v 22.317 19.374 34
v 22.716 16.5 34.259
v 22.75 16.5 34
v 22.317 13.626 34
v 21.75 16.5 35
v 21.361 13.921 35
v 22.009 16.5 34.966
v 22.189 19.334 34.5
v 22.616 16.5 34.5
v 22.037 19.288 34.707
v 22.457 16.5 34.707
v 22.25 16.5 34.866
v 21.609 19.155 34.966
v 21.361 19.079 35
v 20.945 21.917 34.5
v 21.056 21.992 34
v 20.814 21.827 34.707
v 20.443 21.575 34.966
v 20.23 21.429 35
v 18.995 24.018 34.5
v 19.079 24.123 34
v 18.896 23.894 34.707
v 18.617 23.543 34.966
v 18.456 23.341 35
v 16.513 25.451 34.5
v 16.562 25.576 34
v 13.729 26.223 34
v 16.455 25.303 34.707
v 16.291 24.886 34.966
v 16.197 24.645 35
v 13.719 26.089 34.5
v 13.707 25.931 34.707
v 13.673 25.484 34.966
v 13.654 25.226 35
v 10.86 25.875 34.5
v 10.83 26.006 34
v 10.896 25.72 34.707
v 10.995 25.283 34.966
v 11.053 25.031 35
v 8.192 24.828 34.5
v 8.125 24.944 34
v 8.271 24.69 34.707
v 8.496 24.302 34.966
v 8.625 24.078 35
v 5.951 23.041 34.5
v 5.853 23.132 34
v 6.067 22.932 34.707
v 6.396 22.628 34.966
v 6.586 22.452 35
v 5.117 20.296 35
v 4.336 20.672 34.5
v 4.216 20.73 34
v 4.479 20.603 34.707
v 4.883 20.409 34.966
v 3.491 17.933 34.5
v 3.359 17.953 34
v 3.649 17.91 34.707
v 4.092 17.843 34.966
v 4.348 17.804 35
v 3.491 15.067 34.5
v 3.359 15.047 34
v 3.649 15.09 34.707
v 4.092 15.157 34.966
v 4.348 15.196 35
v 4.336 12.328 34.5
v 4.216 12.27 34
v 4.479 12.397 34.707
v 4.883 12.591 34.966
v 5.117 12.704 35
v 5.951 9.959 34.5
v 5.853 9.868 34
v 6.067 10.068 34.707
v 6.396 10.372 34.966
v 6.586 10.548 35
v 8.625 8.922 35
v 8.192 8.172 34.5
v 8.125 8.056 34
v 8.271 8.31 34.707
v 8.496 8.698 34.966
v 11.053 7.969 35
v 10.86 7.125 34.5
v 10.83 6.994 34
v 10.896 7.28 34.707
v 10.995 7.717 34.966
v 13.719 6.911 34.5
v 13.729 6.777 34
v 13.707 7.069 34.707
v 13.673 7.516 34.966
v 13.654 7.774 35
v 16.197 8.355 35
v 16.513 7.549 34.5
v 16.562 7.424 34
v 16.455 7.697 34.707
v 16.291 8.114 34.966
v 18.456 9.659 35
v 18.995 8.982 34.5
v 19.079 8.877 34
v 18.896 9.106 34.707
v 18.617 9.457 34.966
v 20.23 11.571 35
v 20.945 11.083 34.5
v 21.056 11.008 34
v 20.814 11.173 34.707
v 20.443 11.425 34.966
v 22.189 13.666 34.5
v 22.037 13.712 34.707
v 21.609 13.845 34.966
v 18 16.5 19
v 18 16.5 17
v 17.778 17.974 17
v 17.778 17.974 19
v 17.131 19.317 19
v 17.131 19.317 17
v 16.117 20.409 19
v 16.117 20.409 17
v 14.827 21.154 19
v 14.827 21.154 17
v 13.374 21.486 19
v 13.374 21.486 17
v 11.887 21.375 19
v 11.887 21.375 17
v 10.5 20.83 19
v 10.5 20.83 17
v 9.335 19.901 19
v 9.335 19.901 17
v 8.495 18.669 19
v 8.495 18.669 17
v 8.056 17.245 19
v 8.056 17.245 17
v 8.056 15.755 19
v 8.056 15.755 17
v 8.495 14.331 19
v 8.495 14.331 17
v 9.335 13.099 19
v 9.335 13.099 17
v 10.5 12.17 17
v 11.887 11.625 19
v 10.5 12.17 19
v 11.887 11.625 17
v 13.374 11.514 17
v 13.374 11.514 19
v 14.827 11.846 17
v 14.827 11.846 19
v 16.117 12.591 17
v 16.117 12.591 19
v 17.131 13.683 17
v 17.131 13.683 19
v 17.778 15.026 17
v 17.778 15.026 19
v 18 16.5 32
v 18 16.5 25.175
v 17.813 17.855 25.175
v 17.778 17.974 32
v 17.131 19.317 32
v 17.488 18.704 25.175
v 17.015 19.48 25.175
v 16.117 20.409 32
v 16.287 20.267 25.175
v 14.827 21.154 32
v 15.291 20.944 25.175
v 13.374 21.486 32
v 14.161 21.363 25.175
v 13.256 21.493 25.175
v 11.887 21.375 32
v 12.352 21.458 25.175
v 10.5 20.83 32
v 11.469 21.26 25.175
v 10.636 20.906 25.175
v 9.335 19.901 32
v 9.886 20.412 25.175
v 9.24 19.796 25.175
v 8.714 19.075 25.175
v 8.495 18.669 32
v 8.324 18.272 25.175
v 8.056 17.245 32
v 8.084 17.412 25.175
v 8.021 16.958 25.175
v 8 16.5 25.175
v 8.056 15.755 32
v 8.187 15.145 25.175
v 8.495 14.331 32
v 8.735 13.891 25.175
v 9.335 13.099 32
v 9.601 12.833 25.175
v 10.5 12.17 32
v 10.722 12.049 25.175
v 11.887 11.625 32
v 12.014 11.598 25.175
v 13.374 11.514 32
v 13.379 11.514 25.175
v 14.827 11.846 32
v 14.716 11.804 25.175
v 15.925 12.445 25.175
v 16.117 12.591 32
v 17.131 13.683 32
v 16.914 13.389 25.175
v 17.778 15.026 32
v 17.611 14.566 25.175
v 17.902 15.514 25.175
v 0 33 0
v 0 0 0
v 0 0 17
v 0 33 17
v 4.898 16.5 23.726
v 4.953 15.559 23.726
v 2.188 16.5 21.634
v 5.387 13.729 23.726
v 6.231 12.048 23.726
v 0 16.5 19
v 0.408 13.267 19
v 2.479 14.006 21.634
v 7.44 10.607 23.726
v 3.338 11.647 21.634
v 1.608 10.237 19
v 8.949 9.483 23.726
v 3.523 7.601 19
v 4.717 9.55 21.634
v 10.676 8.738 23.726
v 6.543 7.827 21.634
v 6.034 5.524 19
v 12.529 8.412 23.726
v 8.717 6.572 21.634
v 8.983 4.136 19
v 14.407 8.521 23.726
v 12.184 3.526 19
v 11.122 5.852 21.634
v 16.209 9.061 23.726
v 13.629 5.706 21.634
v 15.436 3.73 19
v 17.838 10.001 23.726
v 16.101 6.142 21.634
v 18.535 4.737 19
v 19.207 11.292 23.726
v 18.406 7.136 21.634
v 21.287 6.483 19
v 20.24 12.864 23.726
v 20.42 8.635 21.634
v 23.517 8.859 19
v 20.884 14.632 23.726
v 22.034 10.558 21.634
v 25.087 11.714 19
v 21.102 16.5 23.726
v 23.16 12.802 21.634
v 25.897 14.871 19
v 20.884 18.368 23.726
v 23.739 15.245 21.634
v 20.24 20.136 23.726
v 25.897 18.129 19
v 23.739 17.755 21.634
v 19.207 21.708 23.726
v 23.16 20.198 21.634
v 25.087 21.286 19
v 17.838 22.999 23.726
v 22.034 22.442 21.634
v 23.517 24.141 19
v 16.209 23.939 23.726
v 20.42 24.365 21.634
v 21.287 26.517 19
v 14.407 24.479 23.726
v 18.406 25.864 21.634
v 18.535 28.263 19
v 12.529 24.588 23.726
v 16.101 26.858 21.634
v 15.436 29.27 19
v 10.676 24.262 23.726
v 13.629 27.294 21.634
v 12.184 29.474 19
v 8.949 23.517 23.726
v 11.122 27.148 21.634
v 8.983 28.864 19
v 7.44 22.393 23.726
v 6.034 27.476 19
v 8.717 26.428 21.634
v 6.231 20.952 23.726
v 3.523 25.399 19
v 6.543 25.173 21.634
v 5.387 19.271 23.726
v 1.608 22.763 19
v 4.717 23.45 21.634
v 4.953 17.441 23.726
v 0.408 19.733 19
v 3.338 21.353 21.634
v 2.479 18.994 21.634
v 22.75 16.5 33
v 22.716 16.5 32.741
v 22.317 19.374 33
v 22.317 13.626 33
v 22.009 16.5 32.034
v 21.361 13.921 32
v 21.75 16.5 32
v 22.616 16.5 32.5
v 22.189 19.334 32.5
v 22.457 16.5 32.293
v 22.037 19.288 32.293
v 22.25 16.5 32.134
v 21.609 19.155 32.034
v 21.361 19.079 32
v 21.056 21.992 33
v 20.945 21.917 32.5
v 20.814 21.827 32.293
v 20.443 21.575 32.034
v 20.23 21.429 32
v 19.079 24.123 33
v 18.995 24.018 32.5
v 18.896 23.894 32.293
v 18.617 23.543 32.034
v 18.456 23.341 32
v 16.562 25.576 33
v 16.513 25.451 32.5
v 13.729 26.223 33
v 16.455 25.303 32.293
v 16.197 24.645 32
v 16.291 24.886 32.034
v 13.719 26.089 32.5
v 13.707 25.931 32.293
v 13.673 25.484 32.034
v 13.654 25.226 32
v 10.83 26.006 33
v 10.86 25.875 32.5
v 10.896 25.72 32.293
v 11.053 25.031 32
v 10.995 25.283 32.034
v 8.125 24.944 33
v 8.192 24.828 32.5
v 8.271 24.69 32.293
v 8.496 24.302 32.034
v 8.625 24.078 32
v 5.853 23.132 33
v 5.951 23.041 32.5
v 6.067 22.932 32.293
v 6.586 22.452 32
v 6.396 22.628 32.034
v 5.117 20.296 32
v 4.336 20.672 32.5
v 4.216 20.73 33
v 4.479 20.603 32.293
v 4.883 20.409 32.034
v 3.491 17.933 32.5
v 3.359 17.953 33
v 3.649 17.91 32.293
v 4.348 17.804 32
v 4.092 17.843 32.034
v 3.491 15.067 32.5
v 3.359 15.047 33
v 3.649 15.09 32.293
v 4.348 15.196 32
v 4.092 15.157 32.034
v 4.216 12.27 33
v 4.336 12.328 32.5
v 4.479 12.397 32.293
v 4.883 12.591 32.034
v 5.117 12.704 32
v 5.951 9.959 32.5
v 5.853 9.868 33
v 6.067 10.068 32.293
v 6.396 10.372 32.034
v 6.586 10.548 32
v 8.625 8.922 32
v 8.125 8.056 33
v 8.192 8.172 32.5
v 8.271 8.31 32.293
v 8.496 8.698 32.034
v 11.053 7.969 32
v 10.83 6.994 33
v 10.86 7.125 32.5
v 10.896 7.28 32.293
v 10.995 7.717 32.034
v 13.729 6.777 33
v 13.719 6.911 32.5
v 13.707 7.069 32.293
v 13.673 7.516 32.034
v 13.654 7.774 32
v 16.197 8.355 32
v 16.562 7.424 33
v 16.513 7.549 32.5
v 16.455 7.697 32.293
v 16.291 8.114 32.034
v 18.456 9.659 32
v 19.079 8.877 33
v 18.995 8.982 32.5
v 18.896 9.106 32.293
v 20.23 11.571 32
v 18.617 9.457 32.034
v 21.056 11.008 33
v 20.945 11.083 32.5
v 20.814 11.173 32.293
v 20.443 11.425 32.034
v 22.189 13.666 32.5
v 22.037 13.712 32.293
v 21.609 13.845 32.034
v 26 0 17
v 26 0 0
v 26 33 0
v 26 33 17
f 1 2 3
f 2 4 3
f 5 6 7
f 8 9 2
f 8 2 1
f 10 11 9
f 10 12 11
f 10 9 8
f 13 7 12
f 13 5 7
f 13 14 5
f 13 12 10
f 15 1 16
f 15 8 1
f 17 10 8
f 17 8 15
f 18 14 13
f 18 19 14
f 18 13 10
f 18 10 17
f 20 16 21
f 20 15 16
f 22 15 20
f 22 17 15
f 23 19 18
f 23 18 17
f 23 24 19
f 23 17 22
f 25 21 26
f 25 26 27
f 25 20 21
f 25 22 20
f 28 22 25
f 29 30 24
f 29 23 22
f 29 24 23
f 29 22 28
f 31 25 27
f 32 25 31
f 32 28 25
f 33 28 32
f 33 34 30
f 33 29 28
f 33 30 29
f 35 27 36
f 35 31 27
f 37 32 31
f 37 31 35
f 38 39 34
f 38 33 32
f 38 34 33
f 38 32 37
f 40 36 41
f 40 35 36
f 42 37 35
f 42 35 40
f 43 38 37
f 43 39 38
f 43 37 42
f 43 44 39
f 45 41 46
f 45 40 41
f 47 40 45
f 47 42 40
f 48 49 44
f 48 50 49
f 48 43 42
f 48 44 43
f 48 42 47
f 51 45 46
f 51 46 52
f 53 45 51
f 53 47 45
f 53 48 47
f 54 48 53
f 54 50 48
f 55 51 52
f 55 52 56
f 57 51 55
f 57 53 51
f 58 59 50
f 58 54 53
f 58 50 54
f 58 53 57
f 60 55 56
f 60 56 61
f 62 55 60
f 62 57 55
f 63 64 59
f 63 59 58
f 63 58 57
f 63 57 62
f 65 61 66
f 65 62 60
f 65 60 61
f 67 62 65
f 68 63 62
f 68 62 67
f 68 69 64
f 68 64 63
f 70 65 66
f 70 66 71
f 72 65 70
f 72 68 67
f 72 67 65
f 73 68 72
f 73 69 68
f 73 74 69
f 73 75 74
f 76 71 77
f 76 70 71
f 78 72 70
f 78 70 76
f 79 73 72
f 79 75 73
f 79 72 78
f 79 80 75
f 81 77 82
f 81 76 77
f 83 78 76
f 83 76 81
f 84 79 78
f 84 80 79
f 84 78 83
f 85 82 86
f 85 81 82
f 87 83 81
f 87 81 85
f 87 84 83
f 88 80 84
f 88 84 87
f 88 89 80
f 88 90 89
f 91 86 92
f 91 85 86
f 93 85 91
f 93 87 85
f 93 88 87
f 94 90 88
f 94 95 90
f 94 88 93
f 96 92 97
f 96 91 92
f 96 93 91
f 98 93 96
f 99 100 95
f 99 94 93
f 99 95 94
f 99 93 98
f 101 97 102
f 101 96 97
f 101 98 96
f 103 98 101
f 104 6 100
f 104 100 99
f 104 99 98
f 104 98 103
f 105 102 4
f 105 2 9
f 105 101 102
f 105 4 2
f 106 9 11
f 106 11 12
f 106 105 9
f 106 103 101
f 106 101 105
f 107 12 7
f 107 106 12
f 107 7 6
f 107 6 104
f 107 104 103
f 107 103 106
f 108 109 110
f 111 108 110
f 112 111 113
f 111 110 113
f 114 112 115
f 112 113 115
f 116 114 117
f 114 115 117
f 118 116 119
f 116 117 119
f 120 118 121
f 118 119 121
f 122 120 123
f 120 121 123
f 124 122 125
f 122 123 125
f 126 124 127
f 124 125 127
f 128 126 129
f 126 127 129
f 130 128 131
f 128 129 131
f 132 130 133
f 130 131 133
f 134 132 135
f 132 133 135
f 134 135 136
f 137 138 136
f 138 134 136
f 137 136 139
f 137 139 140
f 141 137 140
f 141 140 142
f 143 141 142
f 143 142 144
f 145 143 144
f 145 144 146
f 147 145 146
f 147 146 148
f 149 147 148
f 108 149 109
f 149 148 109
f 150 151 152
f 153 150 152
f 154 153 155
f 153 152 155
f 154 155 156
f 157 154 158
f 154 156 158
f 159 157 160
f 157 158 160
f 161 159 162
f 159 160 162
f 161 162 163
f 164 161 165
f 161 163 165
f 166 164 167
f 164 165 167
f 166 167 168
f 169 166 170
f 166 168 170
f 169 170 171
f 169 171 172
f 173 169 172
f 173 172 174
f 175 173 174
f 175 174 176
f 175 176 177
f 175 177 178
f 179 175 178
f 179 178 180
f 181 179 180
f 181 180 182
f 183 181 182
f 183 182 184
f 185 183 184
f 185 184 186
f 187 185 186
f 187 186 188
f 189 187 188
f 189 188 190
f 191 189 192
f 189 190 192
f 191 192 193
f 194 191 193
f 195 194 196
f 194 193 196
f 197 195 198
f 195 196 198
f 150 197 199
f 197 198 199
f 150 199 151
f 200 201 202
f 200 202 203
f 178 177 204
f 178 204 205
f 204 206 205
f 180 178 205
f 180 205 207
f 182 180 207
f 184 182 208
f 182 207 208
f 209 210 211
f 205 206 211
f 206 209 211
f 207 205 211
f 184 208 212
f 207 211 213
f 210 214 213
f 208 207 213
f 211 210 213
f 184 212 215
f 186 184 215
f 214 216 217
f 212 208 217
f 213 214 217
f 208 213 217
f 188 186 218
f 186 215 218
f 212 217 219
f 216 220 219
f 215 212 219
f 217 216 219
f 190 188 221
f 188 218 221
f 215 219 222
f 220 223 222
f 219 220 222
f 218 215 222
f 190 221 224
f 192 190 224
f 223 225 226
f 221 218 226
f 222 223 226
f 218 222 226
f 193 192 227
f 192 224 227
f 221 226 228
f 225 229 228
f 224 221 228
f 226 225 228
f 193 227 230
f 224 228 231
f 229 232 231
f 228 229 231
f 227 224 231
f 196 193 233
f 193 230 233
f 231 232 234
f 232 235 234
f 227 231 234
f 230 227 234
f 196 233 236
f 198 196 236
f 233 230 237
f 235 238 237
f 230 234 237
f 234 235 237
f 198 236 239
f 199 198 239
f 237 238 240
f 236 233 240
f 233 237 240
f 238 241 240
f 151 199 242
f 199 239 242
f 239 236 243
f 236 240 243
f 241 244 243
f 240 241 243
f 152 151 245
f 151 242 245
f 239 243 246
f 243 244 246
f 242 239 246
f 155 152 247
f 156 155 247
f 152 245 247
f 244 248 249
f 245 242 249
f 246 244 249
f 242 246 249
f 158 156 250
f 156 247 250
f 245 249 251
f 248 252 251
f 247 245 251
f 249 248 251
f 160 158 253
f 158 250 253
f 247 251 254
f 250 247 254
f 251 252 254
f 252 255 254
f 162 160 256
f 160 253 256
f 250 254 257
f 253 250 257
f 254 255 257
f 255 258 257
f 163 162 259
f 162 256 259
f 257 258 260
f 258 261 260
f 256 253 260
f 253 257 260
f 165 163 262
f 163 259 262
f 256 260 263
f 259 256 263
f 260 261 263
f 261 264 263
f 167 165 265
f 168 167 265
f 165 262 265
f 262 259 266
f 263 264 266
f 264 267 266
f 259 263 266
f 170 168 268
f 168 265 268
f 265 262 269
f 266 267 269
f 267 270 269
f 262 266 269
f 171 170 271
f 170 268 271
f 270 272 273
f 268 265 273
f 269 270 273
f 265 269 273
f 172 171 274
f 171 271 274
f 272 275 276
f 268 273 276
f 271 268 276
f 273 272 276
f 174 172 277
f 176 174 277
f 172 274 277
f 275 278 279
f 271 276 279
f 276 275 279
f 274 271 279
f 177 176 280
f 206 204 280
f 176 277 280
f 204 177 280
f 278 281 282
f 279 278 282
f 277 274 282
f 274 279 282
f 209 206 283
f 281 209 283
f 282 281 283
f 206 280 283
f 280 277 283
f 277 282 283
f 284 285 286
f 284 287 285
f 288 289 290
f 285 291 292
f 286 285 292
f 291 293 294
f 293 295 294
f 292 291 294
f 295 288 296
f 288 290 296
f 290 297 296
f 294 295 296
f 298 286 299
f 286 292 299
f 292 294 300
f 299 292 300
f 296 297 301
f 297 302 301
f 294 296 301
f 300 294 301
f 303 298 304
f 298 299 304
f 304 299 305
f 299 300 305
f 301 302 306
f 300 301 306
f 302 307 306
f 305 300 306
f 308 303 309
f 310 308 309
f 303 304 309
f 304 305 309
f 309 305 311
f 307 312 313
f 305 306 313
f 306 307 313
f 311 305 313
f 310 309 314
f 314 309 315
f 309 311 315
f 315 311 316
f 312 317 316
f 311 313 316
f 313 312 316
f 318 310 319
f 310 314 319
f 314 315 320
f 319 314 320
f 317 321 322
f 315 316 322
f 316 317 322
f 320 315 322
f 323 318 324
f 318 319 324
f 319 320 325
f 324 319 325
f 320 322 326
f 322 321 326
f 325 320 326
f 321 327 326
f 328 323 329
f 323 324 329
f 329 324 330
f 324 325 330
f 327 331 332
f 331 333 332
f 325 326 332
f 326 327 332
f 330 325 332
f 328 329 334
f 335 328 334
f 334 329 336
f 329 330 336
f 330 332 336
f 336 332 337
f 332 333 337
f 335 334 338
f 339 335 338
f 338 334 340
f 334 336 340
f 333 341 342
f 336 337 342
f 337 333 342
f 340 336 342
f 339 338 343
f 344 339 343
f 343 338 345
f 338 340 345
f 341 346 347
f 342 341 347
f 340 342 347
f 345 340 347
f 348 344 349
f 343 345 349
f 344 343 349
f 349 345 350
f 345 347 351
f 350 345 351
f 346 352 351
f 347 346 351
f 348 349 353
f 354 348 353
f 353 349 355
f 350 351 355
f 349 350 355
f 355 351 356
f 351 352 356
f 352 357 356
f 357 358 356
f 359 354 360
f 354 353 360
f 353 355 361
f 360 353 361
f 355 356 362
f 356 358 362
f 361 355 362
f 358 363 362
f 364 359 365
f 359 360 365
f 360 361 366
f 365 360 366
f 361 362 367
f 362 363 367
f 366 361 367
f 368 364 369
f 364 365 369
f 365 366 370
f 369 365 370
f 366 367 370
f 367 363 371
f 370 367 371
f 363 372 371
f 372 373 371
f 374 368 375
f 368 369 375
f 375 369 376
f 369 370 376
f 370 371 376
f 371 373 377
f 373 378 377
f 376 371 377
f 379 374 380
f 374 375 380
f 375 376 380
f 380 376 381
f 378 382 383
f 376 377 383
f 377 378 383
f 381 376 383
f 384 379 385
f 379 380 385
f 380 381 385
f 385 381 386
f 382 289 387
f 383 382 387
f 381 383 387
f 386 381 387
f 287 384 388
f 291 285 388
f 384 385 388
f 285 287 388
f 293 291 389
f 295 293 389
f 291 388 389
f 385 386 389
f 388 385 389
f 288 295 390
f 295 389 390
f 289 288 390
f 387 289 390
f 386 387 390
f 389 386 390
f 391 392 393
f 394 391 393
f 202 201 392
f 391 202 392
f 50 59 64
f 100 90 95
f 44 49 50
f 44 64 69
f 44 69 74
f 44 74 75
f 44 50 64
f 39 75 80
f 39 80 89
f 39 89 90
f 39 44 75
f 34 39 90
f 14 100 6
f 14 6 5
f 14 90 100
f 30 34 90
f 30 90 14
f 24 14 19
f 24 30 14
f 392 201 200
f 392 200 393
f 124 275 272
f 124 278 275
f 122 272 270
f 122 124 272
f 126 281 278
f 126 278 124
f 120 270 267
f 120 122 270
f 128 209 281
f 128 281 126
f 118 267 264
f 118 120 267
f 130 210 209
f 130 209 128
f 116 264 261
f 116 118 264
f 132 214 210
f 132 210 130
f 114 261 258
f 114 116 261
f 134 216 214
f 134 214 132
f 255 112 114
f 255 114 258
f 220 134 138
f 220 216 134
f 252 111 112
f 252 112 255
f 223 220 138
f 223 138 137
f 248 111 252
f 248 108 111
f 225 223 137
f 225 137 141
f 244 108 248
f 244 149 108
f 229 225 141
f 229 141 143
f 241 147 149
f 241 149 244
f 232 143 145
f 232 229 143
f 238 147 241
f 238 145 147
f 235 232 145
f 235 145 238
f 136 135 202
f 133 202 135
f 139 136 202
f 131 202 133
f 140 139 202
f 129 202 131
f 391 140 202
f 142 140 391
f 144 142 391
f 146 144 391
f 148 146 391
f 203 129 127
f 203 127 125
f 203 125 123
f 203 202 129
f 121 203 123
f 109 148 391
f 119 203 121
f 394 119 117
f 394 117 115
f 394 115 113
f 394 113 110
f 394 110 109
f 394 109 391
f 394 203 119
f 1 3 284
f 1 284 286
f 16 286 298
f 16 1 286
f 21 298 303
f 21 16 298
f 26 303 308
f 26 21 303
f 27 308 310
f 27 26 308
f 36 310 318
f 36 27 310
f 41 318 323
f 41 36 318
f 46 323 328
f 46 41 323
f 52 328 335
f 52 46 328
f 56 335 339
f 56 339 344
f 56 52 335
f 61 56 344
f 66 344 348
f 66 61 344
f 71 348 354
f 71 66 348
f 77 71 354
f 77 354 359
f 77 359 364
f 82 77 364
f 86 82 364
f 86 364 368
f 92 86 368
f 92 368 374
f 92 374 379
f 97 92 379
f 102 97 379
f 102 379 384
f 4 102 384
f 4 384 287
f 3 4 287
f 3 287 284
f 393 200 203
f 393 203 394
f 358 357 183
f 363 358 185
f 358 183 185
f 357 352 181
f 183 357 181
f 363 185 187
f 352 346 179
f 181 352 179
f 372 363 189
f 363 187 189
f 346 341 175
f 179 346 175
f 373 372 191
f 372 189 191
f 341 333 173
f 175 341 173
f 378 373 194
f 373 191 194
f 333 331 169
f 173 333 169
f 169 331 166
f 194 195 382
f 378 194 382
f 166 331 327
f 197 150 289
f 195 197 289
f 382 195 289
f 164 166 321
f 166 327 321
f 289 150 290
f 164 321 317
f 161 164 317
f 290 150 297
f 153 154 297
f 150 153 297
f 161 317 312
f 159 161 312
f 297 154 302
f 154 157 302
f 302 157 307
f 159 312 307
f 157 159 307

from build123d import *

# Parameters (mm, degrees)
SKETCH008_W  = 26
SKETCH008_H  = 33
PAD002_DEPTH = 17
SKETCH009_R  = 5
PAD003_DEPTH = 34
SKETCH011_R  = 9.75
PAD004_DEPTH = 1.5
FILLET002_R  = 1
FILLET003_R  = 1


with BuildPart() as part:
    # Sketch008 → Pad002 (new body)
    with BuildSketch(Plane.XY):
        with Locations((13, 16.5)):
            Rectangle(SKETCH008_W, SKETCH008_H)
    extrude(amount=PAD002_DEPTH)

    # Sketch009 → Pad003 (join)
    with BuildSketch(Plane.XY):
        with Locations((13, 16.5)):
            Circle(SKETCH009_R)
    extrude(amount=PAD003_DEPTH)

    # Sketch010 → Revolution (revolve)
    with BuildSketch(Plane(origin=(13, 16.5, 2), x_dir=(1, 0, 0), z_dir=(0, -1, 0))):
        with BuildLine():
            Line((0, 24), (0, 17))
            Line((0, 17), (-13, 17))
            ThreePointArc((0, 24), (-7.382412, 22.138764), (-13, 17))
        make_face()
    revolve(axis=Axis((13, 16.5, 2), (0, 0, 1)))

    # Sketch011 → Pad004 (join, symmetric)
    with BuildSketch(Plane.XY.offset(33.5)):
        with Locations((13, 16.5)):
            Circle(SKETCH011_R)
    extrude(amount=PAD004_DEPTH, both=True)

    # Fillet002
    fillet002_edges = [part.edges().sort_by_distance(p)[0] for p in [
        (3.25, 16.5, 35),
    ]]
    fillet(fillet002_edges, radius=FILLET002_R)

    # Fillet003
    fillet003_edges = [part.edges().sort_by_distance(p)[0] for p in [
        (3.25, 16.5, 32),
    ]]
    fillet(fillet003_edges, radius=FILLET003_R)


solid = part.part
